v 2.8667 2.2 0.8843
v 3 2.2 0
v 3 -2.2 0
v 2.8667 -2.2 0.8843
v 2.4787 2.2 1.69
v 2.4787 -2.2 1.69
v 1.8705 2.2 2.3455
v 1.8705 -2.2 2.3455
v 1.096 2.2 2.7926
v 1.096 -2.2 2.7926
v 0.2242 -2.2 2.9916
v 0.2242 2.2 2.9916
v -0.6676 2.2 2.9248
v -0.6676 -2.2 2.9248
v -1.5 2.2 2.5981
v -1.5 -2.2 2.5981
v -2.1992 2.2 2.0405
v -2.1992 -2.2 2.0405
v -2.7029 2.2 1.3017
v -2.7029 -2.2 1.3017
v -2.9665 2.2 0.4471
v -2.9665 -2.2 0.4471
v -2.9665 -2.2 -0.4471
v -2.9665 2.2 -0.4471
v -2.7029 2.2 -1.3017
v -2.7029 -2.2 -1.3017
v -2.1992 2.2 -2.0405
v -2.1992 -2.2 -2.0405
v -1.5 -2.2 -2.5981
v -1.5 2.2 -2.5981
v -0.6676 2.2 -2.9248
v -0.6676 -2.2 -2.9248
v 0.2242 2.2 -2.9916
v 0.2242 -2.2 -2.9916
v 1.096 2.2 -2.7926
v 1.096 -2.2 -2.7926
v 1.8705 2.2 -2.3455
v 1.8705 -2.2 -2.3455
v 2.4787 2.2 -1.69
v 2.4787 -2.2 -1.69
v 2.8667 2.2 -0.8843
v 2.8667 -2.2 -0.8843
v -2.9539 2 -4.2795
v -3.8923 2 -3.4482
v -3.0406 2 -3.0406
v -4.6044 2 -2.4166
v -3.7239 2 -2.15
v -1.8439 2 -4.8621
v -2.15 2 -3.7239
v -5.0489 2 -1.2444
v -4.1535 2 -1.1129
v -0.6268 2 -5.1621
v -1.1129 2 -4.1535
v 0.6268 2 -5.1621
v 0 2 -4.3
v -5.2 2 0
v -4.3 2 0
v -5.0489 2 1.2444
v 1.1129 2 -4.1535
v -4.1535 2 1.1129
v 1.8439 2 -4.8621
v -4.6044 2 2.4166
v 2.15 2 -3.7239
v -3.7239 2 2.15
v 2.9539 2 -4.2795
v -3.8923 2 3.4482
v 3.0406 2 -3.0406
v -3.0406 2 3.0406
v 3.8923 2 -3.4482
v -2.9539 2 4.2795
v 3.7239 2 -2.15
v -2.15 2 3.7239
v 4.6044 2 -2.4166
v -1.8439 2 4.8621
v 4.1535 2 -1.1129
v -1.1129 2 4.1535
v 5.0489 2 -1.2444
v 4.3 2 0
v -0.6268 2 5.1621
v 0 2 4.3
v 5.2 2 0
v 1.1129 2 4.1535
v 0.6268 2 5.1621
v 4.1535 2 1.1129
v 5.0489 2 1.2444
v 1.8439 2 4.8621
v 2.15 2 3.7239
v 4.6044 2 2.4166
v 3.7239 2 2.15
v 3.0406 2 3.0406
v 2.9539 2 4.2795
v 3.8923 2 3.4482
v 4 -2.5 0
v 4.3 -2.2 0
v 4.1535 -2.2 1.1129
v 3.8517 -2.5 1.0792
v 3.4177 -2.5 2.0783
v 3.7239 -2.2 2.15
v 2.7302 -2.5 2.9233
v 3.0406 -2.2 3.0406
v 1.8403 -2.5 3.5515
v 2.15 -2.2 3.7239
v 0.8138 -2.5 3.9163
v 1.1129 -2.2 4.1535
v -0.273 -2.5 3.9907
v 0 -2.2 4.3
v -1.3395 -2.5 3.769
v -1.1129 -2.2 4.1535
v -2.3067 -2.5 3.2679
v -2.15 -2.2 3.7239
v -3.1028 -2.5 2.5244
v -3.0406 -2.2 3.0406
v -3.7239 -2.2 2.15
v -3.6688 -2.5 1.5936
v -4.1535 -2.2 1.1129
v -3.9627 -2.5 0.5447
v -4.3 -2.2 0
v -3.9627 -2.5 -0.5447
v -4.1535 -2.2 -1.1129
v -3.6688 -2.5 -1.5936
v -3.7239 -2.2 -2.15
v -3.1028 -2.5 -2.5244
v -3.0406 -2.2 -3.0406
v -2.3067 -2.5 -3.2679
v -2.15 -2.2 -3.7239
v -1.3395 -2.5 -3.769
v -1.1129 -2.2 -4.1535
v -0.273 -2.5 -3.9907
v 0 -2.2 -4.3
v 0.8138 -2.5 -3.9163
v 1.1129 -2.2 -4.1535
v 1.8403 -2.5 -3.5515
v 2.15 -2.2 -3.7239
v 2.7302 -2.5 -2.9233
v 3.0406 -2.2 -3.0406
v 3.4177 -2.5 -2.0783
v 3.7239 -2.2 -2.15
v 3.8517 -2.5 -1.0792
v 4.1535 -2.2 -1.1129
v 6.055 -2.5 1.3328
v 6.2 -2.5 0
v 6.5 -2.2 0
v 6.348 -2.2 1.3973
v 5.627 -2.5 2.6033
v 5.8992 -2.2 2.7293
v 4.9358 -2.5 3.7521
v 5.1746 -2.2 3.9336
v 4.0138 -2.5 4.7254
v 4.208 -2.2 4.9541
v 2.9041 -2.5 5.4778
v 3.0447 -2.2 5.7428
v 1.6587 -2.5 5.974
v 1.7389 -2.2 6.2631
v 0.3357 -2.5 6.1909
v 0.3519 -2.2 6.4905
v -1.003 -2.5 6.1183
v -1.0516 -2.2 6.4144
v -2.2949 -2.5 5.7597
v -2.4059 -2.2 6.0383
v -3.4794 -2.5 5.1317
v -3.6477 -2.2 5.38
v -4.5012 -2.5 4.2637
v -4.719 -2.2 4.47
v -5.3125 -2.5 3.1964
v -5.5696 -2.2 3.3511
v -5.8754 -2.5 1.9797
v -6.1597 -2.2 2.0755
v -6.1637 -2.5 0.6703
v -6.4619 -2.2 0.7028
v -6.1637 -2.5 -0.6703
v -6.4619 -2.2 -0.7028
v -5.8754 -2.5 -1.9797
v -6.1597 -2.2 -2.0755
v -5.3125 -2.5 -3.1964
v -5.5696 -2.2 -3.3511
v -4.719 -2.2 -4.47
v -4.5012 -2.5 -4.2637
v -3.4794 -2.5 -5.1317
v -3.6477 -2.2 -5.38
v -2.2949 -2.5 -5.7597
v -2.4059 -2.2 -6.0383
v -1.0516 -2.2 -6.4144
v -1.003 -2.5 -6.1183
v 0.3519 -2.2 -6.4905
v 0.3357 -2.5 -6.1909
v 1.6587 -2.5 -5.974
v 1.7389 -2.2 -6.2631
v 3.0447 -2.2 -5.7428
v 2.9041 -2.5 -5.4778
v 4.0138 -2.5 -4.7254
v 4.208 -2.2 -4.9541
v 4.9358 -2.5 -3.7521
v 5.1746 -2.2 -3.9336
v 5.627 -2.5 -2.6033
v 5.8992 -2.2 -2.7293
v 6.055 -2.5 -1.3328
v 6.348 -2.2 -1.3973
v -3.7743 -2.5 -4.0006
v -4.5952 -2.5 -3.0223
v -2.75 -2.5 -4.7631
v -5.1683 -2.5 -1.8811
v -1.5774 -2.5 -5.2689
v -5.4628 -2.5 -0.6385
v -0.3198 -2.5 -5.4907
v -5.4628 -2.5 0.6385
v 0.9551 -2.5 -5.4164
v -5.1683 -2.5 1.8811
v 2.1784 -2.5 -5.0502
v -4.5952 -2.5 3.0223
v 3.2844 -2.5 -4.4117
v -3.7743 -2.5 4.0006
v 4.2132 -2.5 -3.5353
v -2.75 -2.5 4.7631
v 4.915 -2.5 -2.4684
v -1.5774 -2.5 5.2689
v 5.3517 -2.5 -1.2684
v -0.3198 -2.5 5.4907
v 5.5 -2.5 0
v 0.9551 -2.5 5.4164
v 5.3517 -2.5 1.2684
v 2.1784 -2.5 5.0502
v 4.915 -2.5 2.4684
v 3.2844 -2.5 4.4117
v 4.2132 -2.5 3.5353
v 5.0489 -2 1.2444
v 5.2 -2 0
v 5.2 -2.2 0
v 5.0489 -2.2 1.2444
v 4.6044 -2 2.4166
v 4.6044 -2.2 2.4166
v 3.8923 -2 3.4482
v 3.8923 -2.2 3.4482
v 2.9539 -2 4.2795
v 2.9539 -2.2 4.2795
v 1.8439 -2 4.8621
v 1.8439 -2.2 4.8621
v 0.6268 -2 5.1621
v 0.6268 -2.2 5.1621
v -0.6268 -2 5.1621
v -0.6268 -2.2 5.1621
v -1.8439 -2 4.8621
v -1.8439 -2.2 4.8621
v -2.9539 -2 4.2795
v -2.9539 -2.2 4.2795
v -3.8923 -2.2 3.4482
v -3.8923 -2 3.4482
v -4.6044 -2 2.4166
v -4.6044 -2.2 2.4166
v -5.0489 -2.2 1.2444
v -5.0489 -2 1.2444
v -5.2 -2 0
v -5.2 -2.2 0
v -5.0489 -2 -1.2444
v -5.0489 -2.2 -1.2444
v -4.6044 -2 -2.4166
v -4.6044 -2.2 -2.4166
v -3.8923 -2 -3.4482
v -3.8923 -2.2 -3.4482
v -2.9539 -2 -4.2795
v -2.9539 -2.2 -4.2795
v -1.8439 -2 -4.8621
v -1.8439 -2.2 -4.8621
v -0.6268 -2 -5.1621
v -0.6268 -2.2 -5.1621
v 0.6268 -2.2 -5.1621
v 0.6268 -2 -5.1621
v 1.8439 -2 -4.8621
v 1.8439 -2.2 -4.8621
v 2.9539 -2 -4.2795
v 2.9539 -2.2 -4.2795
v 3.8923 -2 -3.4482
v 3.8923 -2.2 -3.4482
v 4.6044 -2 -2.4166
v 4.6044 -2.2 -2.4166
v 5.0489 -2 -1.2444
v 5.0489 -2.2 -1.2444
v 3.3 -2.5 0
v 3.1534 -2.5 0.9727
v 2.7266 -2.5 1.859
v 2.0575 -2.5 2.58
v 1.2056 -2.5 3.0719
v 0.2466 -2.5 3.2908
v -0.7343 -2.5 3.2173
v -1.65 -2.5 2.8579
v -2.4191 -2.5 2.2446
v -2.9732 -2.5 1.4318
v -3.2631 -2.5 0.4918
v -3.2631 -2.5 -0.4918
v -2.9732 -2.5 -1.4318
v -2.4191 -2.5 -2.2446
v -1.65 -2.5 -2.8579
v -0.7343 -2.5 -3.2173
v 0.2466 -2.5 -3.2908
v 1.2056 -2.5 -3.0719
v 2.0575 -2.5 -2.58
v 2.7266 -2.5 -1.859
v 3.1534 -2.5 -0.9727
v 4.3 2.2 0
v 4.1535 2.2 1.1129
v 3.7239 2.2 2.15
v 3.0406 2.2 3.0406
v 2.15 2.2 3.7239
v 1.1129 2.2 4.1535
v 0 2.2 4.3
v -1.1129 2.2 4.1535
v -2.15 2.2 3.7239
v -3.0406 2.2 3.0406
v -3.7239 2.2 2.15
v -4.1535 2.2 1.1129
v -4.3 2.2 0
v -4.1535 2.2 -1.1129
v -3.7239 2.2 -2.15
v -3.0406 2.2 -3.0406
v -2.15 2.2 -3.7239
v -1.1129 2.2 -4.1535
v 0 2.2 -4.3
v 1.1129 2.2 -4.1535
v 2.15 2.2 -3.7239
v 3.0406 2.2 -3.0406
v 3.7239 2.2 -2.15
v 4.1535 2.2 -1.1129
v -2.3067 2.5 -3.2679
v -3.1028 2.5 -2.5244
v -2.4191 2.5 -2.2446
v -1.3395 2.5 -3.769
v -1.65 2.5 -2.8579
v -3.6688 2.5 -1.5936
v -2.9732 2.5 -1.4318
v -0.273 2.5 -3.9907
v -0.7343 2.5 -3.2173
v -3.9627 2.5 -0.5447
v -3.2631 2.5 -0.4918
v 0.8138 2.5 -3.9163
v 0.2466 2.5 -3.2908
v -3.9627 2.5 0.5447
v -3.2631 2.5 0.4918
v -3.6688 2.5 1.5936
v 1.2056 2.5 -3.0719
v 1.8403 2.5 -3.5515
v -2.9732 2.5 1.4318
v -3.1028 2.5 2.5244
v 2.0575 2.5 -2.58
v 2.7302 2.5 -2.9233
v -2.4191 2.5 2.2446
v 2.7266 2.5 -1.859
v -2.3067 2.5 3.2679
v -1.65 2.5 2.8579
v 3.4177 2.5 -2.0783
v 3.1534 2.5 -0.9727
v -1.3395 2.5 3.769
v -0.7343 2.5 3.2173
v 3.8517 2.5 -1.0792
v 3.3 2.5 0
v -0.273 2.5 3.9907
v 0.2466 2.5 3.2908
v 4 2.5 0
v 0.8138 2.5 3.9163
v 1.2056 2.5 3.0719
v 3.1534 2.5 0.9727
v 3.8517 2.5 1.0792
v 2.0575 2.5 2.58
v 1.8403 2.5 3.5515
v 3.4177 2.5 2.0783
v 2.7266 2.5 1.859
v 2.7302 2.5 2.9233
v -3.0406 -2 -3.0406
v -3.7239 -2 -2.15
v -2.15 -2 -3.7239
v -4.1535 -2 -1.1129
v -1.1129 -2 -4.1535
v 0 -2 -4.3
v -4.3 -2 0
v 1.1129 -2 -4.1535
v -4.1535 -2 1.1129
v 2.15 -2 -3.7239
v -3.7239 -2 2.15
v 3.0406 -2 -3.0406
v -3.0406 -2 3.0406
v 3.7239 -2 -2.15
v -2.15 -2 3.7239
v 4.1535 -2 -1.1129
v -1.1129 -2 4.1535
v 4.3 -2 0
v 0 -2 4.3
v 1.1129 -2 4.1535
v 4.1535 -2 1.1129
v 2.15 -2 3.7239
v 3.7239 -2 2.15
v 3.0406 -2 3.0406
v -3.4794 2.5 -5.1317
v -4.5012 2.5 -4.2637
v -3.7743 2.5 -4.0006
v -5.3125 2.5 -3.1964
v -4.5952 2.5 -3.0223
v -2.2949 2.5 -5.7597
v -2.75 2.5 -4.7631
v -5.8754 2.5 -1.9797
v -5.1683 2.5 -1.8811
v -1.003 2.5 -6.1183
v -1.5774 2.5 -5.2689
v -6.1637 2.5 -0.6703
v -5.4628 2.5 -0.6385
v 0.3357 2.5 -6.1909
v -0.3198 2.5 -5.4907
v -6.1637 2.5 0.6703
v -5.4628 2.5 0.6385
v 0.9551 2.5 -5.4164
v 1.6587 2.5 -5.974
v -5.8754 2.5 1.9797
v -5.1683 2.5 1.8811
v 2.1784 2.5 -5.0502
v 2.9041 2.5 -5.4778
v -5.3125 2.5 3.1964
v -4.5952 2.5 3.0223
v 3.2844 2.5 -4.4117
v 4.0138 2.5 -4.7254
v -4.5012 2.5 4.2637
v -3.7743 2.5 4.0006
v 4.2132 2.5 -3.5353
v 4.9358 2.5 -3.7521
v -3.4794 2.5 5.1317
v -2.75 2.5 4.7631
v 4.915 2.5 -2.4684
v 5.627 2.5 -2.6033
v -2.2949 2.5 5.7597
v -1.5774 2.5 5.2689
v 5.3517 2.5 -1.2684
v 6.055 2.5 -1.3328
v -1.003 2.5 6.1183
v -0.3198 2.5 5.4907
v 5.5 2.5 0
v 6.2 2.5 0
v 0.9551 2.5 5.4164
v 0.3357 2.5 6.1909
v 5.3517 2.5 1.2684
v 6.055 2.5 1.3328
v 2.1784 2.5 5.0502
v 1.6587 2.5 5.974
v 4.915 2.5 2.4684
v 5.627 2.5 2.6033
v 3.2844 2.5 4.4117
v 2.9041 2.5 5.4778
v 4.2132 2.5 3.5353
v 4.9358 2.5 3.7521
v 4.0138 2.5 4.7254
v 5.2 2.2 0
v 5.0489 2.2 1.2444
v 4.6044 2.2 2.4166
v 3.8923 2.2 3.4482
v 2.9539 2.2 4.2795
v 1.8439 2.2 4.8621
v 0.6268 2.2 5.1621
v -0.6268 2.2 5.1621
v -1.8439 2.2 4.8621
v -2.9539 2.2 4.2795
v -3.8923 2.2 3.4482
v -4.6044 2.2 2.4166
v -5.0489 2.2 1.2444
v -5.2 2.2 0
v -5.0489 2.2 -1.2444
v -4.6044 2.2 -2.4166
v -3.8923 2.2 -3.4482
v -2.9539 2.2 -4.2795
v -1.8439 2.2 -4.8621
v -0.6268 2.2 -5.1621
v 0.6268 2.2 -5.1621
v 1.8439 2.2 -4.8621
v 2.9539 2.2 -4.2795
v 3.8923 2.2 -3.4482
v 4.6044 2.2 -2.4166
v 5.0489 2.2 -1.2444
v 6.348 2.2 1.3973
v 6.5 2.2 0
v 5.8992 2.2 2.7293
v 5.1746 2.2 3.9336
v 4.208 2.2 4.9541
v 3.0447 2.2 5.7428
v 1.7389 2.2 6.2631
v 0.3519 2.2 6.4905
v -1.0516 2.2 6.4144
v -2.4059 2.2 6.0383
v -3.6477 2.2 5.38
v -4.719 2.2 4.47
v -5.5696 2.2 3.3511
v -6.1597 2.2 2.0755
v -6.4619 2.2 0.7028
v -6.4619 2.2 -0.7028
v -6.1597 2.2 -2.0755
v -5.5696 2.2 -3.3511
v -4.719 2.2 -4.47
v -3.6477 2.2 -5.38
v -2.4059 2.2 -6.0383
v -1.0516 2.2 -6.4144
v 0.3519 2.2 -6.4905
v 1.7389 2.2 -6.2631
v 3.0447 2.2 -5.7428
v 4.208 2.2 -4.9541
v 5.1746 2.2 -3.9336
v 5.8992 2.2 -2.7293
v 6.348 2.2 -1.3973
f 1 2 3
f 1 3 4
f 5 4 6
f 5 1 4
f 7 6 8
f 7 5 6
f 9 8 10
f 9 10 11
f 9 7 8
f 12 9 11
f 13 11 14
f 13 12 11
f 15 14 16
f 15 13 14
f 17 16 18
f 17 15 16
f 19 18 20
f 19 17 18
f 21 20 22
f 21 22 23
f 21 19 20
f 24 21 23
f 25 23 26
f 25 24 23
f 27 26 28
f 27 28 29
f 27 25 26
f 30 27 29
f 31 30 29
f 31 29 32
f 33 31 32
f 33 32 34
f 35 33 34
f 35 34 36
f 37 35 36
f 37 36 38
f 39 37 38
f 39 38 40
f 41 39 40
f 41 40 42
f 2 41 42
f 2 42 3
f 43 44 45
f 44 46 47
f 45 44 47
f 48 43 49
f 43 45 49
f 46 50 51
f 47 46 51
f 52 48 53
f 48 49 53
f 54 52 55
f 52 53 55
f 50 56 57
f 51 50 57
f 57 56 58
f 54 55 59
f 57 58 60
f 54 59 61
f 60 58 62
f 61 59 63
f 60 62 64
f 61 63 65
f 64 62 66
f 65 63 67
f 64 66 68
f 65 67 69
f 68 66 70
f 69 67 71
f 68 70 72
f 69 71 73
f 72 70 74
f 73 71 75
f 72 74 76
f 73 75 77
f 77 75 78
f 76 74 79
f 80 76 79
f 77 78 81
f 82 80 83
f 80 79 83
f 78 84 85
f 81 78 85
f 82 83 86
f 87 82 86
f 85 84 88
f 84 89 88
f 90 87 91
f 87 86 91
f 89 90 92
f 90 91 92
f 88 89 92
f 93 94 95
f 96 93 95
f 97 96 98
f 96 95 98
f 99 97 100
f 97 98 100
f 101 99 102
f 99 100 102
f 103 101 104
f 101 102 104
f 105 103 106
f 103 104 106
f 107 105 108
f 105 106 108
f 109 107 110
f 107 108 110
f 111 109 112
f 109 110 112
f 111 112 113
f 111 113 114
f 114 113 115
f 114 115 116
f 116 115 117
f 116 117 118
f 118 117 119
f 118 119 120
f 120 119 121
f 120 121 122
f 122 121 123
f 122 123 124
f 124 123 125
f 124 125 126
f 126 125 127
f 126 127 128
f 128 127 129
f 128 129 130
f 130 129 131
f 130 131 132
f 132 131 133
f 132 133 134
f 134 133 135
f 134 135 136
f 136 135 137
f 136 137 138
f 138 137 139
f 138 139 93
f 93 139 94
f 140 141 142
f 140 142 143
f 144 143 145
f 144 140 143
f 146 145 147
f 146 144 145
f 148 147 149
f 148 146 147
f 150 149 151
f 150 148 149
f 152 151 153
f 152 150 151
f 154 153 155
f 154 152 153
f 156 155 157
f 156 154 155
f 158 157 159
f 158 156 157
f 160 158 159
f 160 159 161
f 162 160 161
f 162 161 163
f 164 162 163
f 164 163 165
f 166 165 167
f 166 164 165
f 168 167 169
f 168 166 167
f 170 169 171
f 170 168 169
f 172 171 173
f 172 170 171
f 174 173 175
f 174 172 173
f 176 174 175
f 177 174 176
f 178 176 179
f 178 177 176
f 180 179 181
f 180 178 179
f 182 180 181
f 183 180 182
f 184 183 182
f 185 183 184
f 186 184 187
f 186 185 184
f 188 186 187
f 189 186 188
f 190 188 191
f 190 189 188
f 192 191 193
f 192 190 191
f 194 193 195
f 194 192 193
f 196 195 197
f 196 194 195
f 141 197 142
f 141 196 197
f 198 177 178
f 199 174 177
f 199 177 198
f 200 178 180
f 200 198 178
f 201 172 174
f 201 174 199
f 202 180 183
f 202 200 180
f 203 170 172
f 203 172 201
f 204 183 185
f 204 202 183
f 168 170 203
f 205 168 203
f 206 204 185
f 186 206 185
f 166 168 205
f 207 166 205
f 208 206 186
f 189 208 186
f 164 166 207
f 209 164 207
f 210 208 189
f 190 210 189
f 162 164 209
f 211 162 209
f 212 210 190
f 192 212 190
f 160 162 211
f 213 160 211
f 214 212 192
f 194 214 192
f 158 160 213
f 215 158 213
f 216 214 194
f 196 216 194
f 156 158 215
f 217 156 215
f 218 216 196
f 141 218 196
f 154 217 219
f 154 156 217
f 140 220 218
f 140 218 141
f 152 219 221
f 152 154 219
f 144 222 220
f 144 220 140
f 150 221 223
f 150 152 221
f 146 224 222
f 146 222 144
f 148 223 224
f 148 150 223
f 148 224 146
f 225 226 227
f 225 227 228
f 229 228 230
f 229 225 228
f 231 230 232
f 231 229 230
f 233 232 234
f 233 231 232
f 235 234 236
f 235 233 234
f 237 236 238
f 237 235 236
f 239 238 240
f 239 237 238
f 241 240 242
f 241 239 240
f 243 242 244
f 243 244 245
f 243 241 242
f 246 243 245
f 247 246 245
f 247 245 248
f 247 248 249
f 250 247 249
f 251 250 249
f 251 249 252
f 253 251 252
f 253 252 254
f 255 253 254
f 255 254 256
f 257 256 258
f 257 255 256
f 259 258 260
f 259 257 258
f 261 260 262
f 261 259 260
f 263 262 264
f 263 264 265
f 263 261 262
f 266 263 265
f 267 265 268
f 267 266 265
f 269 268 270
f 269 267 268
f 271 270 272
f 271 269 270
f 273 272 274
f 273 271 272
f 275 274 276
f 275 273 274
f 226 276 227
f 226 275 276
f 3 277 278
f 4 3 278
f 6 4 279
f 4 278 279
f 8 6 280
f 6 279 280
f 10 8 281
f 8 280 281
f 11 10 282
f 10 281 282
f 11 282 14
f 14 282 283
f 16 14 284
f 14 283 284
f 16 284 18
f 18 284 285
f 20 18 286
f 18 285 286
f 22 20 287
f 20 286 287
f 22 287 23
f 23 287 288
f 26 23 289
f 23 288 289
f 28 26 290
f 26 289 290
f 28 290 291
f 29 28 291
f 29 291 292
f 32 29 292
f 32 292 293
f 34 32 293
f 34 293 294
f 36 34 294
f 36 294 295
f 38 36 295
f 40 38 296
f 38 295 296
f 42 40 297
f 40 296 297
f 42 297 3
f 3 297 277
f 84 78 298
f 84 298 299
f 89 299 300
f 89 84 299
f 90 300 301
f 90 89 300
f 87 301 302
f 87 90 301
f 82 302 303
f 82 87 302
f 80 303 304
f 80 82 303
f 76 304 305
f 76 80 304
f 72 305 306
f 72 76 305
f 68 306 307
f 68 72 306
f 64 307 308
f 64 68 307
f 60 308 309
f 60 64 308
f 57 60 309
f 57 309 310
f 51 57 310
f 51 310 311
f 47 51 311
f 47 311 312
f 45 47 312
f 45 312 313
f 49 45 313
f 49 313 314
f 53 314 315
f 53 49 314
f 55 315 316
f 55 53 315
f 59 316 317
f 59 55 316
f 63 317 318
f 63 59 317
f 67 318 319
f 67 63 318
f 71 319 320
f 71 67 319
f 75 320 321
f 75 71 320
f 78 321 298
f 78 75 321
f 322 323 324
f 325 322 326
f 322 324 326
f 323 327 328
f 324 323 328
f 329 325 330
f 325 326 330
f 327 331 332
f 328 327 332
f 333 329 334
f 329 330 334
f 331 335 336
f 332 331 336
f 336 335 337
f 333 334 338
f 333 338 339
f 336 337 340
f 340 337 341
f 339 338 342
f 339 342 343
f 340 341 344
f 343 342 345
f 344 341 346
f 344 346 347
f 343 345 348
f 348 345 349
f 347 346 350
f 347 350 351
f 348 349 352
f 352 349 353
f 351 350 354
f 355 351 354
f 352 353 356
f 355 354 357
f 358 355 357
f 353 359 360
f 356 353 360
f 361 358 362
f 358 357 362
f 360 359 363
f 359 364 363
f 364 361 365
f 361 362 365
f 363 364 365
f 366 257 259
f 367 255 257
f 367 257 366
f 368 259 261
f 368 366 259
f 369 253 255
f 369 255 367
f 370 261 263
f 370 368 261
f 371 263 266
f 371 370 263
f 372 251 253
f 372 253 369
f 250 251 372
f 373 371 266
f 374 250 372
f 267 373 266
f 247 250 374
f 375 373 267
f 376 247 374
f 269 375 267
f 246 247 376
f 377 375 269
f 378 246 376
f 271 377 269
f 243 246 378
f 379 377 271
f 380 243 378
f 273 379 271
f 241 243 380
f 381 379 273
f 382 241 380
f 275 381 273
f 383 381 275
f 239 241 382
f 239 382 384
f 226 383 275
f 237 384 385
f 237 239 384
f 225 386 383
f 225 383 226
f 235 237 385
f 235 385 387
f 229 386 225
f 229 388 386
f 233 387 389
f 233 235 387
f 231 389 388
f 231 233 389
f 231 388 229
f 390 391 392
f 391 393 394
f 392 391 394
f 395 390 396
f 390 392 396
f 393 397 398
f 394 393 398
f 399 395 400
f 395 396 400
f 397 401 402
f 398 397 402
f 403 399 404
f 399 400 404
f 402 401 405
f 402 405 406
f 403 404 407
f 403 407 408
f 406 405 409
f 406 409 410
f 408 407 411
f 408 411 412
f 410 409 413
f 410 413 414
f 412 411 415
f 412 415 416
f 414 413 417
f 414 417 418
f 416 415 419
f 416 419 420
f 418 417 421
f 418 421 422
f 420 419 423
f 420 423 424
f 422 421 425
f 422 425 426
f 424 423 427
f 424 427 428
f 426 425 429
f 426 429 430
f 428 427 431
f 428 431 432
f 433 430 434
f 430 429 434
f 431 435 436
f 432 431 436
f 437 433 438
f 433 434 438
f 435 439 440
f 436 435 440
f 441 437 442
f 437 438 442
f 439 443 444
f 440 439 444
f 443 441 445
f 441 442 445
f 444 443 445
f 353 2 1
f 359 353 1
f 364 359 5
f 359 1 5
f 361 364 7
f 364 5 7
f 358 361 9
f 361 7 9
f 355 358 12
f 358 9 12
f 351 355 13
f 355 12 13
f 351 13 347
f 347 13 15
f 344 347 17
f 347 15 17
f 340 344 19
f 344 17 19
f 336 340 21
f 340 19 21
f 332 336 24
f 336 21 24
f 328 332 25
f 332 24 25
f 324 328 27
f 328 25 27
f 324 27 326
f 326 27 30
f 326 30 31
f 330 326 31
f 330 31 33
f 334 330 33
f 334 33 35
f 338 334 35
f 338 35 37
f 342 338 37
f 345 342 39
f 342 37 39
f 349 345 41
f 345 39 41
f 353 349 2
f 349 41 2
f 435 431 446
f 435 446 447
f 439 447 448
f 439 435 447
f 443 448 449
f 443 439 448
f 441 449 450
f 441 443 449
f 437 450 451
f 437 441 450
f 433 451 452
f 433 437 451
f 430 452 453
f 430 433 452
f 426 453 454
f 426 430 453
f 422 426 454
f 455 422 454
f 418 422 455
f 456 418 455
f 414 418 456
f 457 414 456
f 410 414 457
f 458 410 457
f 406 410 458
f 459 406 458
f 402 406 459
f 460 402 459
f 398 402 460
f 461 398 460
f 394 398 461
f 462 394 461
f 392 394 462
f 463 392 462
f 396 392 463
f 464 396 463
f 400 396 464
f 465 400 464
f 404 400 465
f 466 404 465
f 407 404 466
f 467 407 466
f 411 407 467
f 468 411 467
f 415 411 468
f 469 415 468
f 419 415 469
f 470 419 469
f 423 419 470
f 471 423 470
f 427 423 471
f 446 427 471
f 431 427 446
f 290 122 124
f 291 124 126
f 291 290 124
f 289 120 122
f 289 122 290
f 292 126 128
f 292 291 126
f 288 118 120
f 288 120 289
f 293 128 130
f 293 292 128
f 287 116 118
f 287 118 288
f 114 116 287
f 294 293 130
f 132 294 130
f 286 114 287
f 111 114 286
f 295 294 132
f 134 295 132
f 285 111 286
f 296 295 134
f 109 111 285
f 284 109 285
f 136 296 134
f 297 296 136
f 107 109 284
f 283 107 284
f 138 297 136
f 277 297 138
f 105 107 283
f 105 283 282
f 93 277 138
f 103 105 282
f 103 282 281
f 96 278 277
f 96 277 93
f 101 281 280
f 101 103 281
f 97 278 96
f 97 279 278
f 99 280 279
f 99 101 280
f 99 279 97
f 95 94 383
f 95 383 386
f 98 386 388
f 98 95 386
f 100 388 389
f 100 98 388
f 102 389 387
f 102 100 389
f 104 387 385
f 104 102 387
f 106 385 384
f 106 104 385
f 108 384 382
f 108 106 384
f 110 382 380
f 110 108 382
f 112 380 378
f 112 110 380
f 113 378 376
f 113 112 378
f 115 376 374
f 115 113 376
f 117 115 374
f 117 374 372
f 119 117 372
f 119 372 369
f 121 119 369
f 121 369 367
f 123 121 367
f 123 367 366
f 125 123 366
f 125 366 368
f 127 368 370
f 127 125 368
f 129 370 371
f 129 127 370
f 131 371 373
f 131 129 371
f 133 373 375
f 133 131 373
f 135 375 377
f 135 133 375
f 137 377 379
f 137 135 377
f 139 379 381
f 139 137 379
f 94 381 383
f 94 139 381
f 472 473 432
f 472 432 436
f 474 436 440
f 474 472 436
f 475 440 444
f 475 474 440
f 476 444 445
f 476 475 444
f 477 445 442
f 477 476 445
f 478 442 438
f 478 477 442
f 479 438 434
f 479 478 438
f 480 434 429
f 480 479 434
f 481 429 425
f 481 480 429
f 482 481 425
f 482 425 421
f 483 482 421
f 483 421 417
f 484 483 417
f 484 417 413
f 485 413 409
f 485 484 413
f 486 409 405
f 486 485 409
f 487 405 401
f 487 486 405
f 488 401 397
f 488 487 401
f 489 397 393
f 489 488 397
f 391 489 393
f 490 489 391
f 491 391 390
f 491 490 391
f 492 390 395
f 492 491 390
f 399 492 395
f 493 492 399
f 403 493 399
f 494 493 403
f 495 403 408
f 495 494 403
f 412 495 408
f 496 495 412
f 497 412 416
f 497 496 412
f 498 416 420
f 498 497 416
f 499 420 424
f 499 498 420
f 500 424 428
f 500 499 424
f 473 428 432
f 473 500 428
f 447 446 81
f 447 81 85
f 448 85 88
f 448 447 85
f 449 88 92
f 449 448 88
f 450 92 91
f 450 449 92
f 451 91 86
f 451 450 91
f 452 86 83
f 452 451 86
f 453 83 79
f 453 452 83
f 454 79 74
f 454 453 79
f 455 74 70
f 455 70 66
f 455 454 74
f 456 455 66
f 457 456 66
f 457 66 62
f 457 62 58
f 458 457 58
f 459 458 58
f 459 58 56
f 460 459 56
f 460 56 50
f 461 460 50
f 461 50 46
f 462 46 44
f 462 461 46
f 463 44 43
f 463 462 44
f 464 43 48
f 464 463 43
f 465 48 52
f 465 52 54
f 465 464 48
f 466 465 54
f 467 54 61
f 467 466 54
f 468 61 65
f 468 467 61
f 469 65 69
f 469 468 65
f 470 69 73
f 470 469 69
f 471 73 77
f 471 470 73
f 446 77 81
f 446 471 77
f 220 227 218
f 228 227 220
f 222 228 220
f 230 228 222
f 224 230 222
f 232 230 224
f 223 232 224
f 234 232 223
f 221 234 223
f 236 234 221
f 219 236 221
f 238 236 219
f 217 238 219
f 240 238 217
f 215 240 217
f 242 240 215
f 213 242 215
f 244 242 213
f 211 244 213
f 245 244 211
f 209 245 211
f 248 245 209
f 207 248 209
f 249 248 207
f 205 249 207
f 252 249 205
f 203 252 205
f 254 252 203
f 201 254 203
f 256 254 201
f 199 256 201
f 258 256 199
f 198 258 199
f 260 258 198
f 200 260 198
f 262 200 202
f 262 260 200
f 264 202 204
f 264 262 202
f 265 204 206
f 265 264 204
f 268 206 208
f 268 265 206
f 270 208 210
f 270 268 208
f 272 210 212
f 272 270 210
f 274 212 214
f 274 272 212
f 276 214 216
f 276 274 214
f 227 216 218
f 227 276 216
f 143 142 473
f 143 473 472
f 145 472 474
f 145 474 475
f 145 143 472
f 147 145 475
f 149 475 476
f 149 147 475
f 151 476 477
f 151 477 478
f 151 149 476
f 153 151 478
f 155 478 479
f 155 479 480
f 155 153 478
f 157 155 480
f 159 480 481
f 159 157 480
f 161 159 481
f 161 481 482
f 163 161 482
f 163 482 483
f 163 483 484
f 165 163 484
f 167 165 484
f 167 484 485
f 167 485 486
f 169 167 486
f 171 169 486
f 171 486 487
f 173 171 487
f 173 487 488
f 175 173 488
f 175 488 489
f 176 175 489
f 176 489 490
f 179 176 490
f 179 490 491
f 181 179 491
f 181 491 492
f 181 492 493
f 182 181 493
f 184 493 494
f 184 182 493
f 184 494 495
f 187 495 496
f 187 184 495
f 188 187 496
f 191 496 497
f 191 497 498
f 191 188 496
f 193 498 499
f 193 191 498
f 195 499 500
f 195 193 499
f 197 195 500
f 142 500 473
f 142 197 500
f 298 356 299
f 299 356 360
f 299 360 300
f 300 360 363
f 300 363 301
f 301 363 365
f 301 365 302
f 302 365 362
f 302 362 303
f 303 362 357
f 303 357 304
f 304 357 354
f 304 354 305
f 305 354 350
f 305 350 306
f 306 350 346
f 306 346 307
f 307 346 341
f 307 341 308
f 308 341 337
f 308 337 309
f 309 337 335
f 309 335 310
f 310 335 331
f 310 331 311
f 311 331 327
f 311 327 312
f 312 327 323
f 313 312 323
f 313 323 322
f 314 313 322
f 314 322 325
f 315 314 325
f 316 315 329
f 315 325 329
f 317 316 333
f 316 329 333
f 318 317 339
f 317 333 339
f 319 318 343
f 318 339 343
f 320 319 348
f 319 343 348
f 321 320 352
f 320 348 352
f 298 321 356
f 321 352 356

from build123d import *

# Parameters (mm, degrees)
F1_R     = 6.5
F1_R_2   = 5.2
F2_DEPTH = 2.5
F1_R_3   = 4.3
F1_R_4   = 3
F3_DEPTH = 2
F4_SIZE  = 0.3


with BuildPart() as f2:
    # F1 (on Front) → F2 (new body, symmetric)
    with BuildSketch(Plane.XZ):
        Circle(F1_R)
        Circle(F1_R_2, mode=Mode.SUBTRACT)
    extrude(amount=F2_DEPTH, both=True)



with BuildPart() as f2b:
    # F1 (on Front) → F2, piece 2 (new body, symmetric)
    with BuildSketch(Plane.XZ):
        Circle(F1_R_3)
        Circle(F1_R_4, mode=Mode.SUBTRACT)
    extrude(amount=F2_DEPTH, both=True)


with BuildPart() as f2_1:
    add(f2.part)

    add(f2b.part)  # F3 merges F2b
    # F1 (on Front) → F3 (join, symmetric)
    with BuildSketch(Plane.XZ):
        Circle(F1_R_2)
        Circle(F1_R_3, mode=Mode.SUBTRACT)
    extrude(amount=F3_DEPTH, both=True)

    # F4
    f4_edges = [f2_1.edges().sort_by_distance(p)[0] for p in [
        (-6.5, -2.5, 0),
        (-5.2, -2.5, 0),
        (-4.3, -2.5, 0),
        (-3, -2.5, 0),
        (-6.5, 2.5, 0),
        (-5.2, 2.5, 0),
        (-4.3, 2.5, 0),
        (-3, 2.5, 0),
    ]]
    chamfer(f4_edges, length=F4_SIZE)


solid = f2_1.part
